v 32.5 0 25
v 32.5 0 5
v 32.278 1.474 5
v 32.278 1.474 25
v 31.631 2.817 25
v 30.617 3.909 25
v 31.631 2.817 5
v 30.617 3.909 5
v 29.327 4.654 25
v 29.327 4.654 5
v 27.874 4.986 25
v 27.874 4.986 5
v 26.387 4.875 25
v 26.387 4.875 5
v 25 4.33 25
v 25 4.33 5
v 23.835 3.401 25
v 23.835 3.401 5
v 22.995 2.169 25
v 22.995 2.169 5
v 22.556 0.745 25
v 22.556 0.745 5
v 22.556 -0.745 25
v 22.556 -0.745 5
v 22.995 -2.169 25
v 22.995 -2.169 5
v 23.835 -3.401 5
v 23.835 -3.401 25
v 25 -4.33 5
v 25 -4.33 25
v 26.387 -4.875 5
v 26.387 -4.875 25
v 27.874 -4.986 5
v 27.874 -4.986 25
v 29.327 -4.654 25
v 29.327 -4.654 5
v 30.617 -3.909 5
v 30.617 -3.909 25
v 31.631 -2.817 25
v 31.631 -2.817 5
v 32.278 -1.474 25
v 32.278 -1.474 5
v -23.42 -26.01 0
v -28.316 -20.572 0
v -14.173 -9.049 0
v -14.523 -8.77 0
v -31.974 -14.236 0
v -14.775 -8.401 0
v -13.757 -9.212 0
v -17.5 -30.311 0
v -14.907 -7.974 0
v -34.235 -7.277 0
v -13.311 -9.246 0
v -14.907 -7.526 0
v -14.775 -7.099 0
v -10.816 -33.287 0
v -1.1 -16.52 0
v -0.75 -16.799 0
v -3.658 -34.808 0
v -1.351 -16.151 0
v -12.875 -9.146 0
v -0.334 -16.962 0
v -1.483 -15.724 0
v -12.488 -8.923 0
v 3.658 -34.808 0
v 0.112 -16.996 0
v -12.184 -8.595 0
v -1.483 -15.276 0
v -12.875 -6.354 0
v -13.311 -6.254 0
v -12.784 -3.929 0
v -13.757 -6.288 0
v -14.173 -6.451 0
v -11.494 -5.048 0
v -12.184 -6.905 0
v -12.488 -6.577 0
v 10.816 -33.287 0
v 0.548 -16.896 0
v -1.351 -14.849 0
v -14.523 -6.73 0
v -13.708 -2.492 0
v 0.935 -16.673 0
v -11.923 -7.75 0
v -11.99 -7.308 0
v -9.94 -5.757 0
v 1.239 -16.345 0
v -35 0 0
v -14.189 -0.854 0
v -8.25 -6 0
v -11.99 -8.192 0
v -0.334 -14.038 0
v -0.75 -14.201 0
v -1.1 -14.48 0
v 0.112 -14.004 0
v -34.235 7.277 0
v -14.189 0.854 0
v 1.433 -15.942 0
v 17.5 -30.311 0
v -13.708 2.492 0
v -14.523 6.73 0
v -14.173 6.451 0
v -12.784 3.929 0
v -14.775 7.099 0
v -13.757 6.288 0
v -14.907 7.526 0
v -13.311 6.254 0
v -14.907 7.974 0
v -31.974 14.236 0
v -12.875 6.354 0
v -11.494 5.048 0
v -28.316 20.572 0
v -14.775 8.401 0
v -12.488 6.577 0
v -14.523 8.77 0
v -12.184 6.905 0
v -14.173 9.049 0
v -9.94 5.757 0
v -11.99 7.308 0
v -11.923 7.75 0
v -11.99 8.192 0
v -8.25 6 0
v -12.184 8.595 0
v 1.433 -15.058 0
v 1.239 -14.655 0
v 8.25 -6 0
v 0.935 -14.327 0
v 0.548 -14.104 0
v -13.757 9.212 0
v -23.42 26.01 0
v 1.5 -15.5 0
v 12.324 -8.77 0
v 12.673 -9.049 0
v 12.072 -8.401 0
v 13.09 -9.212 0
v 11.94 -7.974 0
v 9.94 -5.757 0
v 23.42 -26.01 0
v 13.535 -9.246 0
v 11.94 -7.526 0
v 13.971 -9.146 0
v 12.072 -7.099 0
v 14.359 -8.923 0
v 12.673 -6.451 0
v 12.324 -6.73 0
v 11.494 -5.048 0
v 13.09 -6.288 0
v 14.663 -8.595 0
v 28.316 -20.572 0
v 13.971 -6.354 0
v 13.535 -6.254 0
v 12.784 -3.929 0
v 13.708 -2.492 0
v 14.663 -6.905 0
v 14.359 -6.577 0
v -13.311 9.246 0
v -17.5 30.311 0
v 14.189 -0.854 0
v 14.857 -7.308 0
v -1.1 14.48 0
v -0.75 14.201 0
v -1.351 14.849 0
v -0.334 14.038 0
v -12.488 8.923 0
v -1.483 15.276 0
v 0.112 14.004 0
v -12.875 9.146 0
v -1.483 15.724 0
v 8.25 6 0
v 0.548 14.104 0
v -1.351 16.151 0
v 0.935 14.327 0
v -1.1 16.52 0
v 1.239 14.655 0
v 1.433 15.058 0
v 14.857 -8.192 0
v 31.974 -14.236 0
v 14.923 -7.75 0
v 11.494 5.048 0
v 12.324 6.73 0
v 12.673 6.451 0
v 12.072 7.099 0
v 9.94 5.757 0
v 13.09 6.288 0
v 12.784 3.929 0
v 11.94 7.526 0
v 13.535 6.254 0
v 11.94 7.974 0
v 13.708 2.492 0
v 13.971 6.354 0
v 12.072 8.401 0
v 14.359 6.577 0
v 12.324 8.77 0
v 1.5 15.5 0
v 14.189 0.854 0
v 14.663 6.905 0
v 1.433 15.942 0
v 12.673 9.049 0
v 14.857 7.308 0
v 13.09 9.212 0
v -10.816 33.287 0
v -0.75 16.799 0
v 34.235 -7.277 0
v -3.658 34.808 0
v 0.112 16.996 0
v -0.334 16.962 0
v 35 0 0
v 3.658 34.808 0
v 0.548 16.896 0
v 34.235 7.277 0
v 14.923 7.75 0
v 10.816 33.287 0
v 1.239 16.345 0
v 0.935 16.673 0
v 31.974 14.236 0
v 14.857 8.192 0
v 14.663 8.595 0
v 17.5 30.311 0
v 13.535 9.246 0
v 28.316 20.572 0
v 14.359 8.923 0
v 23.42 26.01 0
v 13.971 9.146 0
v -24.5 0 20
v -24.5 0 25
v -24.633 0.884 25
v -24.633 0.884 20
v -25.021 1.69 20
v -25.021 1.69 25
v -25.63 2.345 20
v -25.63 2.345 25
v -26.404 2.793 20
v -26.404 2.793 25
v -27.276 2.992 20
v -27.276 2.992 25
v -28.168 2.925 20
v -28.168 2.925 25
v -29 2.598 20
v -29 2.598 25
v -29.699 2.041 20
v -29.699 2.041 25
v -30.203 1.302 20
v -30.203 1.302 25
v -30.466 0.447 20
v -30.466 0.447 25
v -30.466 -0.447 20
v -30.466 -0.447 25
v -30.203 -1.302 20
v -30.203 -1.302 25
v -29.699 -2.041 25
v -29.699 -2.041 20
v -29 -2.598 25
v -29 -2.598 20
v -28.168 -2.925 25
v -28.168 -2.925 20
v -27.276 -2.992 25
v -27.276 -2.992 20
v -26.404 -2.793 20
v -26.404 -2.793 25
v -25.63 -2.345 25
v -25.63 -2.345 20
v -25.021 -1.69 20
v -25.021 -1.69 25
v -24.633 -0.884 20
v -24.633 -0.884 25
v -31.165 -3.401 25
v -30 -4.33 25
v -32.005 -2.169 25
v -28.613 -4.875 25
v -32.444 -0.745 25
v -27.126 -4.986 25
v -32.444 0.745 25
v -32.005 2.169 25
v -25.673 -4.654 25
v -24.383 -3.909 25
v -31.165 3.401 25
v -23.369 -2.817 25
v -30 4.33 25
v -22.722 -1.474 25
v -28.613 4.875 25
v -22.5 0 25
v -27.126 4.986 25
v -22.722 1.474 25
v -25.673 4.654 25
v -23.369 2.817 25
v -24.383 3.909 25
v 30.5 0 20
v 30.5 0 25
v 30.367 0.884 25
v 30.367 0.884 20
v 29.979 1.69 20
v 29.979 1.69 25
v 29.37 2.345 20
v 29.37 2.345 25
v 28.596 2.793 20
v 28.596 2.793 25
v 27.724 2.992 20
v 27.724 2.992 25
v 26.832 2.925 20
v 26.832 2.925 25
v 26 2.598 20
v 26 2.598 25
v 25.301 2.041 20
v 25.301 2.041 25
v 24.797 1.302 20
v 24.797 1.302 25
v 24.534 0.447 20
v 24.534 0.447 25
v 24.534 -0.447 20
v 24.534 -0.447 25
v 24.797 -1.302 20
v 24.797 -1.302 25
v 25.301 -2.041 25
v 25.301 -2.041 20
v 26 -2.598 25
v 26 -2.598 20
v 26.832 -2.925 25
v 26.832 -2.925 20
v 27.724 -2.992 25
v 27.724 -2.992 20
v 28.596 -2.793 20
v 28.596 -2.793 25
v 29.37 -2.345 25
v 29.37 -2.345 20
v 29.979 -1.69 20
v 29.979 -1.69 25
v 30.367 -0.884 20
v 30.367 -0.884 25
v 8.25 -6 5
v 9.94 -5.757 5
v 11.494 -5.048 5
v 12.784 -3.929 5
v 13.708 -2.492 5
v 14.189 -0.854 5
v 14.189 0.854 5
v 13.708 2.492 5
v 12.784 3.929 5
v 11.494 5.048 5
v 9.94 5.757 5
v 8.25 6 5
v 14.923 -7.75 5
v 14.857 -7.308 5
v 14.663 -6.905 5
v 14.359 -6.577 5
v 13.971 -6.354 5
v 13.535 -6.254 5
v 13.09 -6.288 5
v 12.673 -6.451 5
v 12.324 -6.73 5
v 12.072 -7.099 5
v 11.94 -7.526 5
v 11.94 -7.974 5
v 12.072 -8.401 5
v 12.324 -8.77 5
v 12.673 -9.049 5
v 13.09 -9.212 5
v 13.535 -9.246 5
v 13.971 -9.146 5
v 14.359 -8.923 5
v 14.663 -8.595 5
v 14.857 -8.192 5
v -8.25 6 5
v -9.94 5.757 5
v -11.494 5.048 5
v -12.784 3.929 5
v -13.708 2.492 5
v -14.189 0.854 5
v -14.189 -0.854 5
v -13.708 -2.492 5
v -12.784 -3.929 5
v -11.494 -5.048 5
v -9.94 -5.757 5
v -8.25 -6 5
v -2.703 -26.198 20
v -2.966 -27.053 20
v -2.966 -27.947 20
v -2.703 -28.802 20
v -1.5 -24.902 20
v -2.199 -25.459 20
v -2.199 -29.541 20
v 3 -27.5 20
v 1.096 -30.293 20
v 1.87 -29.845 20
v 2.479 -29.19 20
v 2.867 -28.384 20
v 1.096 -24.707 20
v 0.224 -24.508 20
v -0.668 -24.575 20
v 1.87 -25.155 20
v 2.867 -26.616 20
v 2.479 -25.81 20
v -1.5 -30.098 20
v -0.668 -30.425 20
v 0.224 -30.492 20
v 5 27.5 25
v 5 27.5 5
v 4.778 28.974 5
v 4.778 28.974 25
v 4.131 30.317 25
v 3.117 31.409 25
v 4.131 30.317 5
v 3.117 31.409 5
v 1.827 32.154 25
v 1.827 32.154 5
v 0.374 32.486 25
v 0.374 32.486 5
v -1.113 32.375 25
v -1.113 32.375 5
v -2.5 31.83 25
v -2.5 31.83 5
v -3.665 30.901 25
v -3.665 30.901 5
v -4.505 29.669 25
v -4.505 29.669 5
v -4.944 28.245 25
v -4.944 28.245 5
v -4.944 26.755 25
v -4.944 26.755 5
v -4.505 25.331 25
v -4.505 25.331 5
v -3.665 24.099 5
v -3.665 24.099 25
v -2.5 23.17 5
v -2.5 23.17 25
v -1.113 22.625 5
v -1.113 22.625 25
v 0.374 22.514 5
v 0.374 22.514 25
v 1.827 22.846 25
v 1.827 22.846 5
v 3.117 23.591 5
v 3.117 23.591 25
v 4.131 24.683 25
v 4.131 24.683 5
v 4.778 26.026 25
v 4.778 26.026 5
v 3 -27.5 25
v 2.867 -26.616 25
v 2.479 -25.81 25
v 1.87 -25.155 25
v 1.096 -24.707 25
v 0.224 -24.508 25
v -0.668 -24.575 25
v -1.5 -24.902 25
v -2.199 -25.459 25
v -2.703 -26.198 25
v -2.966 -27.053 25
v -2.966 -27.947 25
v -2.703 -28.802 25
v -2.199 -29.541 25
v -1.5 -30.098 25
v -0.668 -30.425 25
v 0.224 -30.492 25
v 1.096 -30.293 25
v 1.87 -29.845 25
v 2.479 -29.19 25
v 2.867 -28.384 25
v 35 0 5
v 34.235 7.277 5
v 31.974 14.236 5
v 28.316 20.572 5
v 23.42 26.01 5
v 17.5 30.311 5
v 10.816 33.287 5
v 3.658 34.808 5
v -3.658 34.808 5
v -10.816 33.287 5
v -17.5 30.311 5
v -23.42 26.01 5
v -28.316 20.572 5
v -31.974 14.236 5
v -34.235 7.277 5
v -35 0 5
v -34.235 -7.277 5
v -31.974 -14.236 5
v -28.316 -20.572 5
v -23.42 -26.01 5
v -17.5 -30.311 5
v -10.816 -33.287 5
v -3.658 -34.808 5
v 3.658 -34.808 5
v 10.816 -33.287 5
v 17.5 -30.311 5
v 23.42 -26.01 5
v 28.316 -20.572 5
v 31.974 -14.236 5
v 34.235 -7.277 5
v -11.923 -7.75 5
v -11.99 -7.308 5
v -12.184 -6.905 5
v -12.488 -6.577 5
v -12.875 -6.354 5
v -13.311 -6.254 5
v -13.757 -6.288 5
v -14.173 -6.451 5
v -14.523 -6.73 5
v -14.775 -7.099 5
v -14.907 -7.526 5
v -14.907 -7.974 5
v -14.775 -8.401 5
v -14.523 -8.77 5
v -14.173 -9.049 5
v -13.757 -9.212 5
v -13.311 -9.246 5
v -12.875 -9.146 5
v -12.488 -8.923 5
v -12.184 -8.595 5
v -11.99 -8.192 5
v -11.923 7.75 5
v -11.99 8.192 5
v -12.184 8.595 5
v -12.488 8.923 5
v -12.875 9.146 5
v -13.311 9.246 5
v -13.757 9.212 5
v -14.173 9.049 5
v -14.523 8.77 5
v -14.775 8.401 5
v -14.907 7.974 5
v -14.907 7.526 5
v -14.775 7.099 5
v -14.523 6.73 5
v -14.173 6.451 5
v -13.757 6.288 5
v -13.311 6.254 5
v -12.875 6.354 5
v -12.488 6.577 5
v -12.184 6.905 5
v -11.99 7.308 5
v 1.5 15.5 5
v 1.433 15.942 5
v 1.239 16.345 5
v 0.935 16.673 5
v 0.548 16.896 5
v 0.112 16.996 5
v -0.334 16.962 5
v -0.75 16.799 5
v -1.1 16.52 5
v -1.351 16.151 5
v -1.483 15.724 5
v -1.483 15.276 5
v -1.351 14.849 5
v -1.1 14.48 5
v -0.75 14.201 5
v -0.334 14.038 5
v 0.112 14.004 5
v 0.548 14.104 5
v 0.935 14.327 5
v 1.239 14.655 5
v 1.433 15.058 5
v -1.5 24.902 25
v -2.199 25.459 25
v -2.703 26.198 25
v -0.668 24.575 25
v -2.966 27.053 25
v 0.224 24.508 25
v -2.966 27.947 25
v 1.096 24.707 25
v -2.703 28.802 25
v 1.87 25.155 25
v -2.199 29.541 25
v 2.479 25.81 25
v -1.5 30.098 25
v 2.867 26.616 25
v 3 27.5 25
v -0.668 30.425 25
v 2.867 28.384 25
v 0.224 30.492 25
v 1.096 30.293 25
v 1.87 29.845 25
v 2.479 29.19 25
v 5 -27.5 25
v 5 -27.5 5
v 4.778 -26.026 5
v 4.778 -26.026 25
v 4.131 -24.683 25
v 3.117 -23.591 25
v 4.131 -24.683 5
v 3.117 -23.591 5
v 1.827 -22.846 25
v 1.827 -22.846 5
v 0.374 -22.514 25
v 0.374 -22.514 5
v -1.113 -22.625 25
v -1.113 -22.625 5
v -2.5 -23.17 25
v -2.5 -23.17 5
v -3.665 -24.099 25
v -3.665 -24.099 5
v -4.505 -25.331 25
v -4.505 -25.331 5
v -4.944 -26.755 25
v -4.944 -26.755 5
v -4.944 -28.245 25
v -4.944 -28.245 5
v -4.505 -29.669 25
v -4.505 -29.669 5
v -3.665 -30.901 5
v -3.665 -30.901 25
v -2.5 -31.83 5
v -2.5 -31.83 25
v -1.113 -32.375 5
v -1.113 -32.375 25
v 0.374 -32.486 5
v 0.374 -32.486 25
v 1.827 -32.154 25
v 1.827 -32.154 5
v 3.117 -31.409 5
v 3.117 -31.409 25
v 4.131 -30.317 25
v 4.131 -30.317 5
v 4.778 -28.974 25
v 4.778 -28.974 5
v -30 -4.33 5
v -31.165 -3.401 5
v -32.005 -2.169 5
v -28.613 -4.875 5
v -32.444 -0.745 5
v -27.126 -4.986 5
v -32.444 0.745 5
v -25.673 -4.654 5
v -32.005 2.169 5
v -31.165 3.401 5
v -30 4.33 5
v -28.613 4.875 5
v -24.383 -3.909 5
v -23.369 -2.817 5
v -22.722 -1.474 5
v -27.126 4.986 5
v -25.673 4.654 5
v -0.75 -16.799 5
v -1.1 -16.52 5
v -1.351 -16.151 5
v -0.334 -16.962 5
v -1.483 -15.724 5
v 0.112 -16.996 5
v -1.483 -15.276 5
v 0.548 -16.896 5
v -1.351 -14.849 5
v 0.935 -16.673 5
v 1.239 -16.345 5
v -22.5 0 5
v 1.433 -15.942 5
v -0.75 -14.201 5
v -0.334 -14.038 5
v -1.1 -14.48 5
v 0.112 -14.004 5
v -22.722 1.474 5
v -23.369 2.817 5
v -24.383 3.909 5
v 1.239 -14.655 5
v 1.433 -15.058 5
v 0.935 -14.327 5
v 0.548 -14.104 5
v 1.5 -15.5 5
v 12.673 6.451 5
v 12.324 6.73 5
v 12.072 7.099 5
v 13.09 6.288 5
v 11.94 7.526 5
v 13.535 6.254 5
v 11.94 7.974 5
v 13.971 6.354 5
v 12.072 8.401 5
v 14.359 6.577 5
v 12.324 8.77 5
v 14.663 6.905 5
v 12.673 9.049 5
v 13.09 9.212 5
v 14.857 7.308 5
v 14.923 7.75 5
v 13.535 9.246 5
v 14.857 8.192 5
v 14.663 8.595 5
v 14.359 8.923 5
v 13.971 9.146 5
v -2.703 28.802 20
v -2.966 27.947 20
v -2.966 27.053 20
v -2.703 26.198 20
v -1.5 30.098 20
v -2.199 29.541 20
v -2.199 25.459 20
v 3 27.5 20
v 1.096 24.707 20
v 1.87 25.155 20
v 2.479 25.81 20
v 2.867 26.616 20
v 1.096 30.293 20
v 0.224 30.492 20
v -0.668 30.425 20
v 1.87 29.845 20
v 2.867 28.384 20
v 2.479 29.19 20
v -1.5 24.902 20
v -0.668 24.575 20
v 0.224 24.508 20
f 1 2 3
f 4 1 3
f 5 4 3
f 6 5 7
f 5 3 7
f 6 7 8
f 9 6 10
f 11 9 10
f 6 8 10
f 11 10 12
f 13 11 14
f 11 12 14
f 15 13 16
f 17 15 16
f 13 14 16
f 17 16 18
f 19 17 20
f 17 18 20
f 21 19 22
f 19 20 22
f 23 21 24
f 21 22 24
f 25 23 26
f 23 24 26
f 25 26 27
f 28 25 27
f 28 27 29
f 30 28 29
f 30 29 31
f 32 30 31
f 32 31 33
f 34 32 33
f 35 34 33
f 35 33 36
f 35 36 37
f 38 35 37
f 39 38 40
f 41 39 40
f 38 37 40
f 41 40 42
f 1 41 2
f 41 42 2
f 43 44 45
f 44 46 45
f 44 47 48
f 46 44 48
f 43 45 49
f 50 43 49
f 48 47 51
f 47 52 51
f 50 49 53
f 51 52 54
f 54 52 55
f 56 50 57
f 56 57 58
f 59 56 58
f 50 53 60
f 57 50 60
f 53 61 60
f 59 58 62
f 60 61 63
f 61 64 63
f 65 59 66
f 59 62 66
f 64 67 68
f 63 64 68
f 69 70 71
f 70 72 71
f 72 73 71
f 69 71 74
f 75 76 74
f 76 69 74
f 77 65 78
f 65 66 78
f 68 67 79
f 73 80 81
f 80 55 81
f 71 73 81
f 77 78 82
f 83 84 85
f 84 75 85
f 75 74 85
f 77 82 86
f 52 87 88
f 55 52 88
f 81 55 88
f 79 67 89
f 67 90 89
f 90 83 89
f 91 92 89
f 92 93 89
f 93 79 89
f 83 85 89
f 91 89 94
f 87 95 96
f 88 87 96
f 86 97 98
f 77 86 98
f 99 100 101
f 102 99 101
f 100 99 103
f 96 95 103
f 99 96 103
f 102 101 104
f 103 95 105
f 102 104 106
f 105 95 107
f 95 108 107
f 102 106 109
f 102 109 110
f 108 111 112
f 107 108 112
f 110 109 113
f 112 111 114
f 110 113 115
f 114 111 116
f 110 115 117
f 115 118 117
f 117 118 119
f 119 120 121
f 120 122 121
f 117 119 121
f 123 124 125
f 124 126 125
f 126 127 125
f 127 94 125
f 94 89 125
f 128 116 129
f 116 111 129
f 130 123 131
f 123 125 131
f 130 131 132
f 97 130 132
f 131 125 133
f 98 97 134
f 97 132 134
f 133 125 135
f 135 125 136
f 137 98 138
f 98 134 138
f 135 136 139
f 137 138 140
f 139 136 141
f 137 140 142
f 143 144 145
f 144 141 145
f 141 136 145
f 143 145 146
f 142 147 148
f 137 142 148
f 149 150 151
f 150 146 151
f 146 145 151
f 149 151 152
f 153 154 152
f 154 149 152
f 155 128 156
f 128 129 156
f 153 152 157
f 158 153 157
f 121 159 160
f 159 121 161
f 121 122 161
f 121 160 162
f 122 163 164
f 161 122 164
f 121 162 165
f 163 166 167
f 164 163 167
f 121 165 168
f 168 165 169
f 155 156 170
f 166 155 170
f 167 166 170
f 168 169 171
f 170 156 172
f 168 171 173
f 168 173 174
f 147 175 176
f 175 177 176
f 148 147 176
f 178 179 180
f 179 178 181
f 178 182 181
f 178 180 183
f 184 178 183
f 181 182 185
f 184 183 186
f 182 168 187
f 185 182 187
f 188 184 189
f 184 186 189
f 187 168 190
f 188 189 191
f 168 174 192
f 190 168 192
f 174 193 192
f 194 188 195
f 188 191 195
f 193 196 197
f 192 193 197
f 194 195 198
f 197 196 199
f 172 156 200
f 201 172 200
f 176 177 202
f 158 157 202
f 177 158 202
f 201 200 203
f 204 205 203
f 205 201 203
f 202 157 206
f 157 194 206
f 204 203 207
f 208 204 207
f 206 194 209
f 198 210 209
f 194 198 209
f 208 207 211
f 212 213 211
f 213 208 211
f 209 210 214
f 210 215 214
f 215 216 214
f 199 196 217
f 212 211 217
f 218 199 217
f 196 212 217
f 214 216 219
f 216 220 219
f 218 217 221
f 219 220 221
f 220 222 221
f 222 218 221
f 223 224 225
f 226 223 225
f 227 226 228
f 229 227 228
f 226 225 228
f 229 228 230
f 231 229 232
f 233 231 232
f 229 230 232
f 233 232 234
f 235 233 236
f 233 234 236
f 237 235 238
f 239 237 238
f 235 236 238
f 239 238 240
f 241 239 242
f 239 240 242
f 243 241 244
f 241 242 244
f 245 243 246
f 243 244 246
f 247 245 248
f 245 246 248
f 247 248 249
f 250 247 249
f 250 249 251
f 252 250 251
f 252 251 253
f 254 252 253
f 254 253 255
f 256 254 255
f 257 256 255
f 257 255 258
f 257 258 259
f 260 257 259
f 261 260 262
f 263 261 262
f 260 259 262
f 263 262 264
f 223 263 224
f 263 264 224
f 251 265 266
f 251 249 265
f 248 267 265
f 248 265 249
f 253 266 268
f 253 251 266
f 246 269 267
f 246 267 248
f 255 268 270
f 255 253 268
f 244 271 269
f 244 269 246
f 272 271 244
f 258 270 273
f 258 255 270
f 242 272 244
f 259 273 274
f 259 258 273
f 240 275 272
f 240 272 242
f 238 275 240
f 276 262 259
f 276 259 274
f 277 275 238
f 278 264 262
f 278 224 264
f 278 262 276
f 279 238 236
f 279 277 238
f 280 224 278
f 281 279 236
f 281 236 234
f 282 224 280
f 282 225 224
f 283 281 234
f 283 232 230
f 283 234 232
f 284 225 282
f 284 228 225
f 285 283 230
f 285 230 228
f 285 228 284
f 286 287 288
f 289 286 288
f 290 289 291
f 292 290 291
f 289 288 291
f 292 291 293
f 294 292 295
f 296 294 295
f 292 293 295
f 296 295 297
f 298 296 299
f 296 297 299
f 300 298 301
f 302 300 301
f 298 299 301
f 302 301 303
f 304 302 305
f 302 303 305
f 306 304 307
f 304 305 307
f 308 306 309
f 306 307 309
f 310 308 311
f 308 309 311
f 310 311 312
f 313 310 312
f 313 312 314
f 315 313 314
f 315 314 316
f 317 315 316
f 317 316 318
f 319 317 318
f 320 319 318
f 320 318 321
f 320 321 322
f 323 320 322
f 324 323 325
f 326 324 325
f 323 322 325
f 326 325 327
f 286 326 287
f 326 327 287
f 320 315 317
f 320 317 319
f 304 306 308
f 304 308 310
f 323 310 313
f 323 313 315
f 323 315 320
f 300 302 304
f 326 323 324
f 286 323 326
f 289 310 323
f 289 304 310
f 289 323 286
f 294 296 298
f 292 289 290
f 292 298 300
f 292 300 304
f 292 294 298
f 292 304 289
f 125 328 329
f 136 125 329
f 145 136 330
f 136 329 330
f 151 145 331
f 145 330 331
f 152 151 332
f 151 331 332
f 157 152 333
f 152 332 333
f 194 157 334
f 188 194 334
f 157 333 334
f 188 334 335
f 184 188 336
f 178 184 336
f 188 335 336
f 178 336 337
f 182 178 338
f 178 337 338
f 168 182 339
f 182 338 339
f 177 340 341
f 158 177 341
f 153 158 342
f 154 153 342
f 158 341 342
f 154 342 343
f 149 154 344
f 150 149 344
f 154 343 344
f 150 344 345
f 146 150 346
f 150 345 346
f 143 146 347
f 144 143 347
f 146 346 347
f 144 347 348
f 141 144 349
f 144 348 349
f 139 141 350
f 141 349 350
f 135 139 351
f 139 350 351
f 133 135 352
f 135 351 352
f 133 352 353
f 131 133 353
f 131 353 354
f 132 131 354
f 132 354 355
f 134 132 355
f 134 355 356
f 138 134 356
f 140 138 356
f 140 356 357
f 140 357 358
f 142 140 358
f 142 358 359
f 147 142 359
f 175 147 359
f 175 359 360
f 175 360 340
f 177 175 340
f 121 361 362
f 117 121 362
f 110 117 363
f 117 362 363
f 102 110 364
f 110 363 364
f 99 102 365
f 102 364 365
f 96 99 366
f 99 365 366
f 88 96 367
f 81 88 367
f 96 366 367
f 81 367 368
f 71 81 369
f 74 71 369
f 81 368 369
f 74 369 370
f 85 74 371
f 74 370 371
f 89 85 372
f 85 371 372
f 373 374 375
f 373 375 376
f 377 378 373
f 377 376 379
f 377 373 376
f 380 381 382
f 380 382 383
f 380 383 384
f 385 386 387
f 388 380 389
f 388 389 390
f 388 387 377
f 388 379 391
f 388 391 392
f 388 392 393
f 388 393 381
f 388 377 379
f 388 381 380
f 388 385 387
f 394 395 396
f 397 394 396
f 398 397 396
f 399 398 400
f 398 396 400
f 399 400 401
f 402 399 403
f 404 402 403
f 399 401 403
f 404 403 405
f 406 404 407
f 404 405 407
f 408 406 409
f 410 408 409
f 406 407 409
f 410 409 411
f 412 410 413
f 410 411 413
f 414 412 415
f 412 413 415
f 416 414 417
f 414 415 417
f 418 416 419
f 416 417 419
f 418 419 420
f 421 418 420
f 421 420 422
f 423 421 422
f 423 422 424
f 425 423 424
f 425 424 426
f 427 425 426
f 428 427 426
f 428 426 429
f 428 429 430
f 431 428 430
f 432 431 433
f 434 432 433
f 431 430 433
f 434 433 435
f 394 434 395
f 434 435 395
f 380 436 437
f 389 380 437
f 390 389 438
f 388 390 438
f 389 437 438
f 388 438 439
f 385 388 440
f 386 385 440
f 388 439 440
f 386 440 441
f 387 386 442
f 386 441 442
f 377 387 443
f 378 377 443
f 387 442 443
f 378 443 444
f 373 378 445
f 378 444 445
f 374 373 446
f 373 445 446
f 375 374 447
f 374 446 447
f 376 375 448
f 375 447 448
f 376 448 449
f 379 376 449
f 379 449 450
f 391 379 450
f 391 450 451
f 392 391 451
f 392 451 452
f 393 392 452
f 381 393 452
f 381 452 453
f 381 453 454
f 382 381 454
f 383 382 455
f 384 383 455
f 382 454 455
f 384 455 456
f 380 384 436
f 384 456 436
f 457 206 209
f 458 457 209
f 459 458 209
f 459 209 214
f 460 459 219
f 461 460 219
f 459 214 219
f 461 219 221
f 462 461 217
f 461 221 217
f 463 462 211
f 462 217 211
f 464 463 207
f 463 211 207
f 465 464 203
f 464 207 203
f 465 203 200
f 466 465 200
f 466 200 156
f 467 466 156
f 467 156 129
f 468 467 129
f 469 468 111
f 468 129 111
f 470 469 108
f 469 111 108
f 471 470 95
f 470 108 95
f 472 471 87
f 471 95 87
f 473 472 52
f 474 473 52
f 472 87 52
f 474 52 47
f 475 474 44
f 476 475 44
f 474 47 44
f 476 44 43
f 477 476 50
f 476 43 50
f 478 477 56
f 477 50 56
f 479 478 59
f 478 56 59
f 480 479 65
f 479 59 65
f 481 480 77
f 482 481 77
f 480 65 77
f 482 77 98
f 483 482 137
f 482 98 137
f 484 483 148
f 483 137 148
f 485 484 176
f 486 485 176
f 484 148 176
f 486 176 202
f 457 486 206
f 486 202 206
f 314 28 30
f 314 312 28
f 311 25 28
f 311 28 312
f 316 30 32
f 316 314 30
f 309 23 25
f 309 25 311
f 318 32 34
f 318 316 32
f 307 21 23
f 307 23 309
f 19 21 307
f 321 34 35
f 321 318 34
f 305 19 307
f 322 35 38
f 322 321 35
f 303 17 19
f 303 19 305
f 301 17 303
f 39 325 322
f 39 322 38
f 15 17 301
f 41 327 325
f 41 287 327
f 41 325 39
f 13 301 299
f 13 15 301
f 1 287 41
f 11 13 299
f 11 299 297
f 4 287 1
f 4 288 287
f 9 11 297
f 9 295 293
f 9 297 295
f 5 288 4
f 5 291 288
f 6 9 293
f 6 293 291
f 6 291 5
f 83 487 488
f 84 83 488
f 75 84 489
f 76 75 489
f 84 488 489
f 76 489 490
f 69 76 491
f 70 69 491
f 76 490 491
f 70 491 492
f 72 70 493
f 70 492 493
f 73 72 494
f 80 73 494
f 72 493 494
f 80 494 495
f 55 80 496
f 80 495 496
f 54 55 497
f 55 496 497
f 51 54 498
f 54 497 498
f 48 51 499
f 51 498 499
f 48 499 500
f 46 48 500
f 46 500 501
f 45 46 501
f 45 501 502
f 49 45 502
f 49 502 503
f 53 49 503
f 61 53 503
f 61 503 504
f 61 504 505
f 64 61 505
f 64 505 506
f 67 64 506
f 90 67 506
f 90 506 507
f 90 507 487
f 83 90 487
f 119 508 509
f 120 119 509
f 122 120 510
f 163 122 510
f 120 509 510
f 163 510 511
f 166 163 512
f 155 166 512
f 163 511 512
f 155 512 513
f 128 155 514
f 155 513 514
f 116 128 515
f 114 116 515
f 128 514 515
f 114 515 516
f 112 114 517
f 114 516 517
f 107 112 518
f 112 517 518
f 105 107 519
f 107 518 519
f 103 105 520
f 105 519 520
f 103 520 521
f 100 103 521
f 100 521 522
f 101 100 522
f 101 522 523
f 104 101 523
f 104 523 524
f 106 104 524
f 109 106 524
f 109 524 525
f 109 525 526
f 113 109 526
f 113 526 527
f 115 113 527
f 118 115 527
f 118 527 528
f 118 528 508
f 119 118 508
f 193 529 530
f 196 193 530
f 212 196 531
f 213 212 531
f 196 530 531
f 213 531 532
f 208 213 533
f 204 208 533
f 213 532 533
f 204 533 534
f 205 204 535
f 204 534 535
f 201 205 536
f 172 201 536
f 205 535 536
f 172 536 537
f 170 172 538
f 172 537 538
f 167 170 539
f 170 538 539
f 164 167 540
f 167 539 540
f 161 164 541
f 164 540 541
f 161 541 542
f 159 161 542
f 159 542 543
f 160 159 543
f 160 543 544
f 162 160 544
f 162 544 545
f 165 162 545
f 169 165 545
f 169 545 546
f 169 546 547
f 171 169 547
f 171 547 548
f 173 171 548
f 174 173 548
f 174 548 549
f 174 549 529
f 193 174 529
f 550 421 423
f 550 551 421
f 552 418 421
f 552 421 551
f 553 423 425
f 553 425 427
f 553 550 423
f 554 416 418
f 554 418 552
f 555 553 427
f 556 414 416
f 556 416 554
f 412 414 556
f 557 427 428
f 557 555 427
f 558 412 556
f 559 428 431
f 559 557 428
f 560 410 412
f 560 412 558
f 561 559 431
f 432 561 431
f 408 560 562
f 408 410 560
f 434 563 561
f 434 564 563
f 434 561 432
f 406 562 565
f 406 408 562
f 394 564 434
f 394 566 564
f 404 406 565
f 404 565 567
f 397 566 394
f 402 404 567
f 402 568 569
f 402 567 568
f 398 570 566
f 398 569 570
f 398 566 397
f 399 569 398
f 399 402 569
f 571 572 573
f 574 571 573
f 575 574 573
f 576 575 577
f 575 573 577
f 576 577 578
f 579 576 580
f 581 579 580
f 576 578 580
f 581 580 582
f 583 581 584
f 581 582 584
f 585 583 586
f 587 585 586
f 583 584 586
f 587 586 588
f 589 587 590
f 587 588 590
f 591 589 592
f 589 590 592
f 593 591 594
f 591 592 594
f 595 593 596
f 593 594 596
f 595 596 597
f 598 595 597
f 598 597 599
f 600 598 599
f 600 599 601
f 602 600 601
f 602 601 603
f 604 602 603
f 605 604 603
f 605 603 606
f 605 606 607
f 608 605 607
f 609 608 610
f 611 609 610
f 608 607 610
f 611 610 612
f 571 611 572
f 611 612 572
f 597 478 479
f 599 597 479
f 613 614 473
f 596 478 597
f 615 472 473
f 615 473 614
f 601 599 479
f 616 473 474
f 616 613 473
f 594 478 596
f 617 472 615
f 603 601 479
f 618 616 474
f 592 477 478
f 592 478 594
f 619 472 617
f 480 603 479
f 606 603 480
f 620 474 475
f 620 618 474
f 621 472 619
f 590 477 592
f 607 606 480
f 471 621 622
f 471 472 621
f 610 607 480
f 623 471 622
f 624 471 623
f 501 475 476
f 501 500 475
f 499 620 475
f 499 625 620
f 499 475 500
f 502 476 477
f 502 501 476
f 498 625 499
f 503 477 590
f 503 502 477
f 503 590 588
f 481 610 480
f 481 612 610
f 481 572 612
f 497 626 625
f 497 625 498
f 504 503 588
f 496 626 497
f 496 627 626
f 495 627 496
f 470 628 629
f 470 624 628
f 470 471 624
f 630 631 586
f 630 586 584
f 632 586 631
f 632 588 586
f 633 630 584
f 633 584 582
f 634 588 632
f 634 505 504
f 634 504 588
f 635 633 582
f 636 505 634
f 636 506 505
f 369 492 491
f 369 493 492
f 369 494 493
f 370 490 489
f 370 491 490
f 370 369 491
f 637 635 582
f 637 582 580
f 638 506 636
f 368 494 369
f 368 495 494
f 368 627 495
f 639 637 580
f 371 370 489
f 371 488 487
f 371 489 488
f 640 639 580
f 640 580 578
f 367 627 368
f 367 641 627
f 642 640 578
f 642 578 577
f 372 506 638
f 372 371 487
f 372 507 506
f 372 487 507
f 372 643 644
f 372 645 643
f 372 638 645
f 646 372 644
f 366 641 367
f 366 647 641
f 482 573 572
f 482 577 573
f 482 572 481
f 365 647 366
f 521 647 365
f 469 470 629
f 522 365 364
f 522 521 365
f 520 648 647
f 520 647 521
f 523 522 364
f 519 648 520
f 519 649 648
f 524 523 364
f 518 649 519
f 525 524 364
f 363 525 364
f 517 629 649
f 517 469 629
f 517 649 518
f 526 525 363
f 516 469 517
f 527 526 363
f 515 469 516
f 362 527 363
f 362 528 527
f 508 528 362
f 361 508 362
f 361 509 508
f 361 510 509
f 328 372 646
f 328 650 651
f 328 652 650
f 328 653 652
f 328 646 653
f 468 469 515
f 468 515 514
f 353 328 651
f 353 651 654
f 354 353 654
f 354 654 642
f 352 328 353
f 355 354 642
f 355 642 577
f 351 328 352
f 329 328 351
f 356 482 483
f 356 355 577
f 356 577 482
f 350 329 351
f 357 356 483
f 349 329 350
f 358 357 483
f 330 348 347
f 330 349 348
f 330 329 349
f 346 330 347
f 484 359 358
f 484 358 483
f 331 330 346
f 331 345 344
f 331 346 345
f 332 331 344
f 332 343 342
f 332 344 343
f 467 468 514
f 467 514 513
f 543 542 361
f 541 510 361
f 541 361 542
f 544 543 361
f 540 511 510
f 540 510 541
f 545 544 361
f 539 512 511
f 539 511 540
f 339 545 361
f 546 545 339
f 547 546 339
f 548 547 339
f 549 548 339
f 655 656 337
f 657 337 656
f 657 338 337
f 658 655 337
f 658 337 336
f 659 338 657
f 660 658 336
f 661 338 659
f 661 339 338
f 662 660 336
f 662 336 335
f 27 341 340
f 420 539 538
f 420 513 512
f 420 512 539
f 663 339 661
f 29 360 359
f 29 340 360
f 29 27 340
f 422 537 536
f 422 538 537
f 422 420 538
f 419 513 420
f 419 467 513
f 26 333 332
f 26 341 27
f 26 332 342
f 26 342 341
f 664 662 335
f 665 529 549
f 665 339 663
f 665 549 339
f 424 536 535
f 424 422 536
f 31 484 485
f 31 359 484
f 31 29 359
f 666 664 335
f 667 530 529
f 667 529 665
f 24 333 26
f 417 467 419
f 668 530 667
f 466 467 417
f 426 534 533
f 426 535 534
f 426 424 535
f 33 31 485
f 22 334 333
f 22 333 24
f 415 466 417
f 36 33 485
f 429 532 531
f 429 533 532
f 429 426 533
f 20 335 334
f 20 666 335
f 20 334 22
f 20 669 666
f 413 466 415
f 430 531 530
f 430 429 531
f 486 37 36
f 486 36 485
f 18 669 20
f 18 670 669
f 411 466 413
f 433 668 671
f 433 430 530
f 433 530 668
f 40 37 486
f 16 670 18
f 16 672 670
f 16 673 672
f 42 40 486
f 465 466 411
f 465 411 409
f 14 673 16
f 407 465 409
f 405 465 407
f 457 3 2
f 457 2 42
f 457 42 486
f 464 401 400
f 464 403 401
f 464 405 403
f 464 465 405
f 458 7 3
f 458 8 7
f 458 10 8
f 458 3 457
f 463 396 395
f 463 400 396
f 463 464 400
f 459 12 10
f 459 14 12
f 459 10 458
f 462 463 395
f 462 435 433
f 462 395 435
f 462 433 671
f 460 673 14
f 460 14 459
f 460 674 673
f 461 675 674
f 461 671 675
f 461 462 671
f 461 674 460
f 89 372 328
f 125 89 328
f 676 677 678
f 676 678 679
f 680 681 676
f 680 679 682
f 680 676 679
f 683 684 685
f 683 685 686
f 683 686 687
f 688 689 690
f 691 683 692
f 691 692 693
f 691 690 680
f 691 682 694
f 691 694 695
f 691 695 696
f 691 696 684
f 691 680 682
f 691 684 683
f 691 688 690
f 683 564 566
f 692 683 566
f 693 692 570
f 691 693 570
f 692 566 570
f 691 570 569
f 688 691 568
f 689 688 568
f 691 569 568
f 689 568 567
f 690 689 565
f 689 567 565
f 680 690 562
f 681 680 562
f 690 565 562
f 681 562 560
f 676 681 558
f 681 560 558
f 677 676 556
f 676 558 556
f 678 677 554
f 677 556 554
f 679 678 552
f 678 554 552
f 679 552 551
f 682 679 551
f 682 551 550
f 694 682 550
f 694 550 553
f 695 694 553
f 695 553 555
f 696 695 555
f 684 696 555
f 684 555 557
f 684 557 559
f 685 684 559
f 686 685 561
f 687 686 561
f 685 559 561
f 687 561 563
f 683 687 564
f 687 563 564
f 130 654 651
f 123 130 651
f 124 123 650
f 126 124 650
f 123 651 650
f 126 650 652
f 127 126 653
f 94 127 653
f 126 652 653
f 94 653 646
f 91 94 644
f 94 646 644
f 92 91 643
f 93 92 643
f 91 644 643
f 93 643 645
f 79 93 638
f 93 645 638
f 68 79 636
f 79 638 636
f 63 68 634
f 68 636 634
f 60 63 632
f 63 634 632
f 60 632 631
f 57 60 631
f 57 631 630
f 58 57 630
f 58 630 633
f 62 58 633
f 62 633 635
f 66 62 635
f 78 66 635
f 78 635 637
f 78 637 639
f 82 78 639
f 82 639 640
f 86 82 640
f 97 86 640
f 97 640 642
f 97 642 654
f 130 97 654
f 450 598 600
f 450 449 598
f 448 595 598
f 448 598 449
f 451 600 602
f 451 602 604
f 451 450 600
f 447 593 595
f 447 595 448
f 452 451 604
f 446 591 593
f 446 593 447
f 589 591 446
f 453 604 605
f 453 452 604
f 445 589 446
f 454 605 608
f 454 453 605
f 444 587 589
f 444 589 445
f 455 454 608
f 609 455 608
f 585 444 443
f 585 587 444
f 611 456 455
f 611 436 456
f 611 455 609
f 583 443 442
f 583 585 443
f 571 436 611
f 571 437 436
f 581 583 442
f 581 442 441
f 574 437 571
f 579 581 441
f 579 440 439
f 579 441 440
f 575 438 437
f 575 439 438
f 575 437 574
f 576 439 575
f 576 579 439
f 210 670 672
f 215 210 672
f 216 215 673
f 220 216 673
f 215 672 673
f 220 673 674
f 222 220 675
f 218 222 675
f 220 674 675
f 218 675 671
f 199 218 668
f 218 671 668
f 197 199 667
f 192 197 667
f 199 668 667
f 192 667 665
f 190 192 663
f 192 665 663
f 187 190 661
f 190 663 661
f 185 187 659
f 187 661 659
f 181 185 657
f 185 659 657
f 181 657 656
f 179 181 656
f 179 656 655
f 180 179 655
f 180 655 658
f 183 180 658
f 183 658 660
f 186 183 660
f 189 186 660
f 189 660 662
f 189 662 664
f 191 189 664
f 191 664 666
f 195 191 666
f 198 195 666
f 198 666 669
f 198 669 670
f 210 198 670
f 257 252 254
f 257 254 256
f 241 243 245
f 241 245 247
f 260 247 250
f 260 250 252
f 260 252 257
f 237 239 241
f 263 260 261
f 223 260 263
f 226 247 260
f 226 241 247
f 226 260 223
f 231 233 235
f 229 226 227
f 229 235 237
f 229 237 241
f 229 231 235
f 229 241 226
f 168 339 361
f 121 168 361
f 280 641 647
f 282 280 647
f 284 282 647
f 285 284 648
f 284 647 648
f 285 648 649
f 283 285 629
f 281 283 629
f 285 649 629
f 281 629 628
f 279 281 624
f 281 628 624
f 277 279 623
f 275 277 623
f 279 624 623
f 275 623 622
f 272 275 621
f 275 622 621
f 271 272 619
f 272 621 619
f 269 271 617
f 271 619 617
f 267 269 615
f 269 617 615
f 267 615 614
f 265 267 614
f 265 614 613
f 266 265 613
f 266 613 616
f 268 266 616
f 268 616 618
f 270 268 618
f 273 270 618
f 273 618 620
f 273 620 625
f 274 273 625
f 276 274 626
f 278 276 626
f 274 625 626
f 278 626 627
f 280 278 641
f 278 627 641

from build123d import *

# Parameters (mm, degrees)
ESBO_O1_R                = 35
RESSALTO_EXTRUS_O1_DEPTH = 5
ESBO_O2_R                = 5
RESSALTO_EXTRUS_O2_DEPTH = 20
ESBO_O3_R                = 3
CORTE_EXTRUS_O1_DEPTH    = 5
CORTE_EXTRUS_O2_DEPTH    = 14
ESBO_O5_R                = 1.5
CORTE_EXTRUS_O3_DEPTH    = 14


with BuildPart() as part:
    # Esboço1 → Ressalto-extrusão1 (new body)
    with BuildSketch(Plane.XY):
        Circle(ESBO_O1_R)
    extrude(amount=RESSALTO_EXTRUS_O1_DEPTH)

    # Esboço2 → Ressalto-extrusão2 (add)
    with BuildSketch(Plane.XY.offset(5)):
        with Locations((27.5, 0)):
            Circle(ESBO_O2_R)
        with Locations((0, -27.5)):
            Circle(ESBO_O2_R)
        with Locations((0, 27.5)):
            Circle(ESBO_O2_R)
        with Locations((-27.5, 0)):
            Circle(ESBO_O2_R)
    extrude(amount=RESSALTO_EXTRUS_O2_DEPTH)

    # Esboço3 → Corte-extrusão1 (cut)
    with BuildSketch(Plane.XY.offset(25)):
        with Locations((0, 27.5)):
            Circle(ESBO_O3_R)
        with Locations((27.5, 0)):
            Circle(ESBO_O3_R)
        with Locations((0, -27.5)):
            Circle(ESBO_O3_R)
        with Locations((-27.5, 0)):
            Circle(ESBO_O3_R)
    extrude(amount=-CORTE_EXTRUS_O1_DEPTH, mode=Mode.SUBTRACT)

    # Esboço4 → Corte-extrusão2 (cut)
    with BuildSketch(Plane.XY.offset(5)):
        with BuildLine():
            Line((8.25, 6), (-8.25, 6))
            ThreePointArc((-8.25, 6), (-14.25, 0), (-8.25, -6))
            Line((-8.25, -6), (8.25, -6))
            ThreePointArc((8.25, -6), (14.25, 0), (8.25, 6))
        make_face()
    extrude(amount=-CORTE_EXTRUS_O2_DEPTH, mode=Mode.SUBTRACT)

    # Esboço5 → Corte-extrusão3 (cut)
    with BuildSketch(Plane.XY.offset(5)):
        with Locations((13.423393759, 7.75)):
            Circle(ESBO_O5_R)
        with Locations((13.423393759, -7.75)):
            Circle(ESBO_O5_R)
        with Locations((0, -15.5)):
            Circle(ESBO_O5_R)
        with Locations((-13.423393759, -7.75)):
            Circle(ESBO_O5_R)
        with Locations((-13.423393759, 7.75)):
            Circle(ESBO_O5_R)
        with Locations((0, 15.5)):
            Circle(ESBO_O5_R)
    extrude(amount=-CORTE_EXTRUS_O3_DEPTH, mode=Mode.SUBTRACT)


solid = part.part
